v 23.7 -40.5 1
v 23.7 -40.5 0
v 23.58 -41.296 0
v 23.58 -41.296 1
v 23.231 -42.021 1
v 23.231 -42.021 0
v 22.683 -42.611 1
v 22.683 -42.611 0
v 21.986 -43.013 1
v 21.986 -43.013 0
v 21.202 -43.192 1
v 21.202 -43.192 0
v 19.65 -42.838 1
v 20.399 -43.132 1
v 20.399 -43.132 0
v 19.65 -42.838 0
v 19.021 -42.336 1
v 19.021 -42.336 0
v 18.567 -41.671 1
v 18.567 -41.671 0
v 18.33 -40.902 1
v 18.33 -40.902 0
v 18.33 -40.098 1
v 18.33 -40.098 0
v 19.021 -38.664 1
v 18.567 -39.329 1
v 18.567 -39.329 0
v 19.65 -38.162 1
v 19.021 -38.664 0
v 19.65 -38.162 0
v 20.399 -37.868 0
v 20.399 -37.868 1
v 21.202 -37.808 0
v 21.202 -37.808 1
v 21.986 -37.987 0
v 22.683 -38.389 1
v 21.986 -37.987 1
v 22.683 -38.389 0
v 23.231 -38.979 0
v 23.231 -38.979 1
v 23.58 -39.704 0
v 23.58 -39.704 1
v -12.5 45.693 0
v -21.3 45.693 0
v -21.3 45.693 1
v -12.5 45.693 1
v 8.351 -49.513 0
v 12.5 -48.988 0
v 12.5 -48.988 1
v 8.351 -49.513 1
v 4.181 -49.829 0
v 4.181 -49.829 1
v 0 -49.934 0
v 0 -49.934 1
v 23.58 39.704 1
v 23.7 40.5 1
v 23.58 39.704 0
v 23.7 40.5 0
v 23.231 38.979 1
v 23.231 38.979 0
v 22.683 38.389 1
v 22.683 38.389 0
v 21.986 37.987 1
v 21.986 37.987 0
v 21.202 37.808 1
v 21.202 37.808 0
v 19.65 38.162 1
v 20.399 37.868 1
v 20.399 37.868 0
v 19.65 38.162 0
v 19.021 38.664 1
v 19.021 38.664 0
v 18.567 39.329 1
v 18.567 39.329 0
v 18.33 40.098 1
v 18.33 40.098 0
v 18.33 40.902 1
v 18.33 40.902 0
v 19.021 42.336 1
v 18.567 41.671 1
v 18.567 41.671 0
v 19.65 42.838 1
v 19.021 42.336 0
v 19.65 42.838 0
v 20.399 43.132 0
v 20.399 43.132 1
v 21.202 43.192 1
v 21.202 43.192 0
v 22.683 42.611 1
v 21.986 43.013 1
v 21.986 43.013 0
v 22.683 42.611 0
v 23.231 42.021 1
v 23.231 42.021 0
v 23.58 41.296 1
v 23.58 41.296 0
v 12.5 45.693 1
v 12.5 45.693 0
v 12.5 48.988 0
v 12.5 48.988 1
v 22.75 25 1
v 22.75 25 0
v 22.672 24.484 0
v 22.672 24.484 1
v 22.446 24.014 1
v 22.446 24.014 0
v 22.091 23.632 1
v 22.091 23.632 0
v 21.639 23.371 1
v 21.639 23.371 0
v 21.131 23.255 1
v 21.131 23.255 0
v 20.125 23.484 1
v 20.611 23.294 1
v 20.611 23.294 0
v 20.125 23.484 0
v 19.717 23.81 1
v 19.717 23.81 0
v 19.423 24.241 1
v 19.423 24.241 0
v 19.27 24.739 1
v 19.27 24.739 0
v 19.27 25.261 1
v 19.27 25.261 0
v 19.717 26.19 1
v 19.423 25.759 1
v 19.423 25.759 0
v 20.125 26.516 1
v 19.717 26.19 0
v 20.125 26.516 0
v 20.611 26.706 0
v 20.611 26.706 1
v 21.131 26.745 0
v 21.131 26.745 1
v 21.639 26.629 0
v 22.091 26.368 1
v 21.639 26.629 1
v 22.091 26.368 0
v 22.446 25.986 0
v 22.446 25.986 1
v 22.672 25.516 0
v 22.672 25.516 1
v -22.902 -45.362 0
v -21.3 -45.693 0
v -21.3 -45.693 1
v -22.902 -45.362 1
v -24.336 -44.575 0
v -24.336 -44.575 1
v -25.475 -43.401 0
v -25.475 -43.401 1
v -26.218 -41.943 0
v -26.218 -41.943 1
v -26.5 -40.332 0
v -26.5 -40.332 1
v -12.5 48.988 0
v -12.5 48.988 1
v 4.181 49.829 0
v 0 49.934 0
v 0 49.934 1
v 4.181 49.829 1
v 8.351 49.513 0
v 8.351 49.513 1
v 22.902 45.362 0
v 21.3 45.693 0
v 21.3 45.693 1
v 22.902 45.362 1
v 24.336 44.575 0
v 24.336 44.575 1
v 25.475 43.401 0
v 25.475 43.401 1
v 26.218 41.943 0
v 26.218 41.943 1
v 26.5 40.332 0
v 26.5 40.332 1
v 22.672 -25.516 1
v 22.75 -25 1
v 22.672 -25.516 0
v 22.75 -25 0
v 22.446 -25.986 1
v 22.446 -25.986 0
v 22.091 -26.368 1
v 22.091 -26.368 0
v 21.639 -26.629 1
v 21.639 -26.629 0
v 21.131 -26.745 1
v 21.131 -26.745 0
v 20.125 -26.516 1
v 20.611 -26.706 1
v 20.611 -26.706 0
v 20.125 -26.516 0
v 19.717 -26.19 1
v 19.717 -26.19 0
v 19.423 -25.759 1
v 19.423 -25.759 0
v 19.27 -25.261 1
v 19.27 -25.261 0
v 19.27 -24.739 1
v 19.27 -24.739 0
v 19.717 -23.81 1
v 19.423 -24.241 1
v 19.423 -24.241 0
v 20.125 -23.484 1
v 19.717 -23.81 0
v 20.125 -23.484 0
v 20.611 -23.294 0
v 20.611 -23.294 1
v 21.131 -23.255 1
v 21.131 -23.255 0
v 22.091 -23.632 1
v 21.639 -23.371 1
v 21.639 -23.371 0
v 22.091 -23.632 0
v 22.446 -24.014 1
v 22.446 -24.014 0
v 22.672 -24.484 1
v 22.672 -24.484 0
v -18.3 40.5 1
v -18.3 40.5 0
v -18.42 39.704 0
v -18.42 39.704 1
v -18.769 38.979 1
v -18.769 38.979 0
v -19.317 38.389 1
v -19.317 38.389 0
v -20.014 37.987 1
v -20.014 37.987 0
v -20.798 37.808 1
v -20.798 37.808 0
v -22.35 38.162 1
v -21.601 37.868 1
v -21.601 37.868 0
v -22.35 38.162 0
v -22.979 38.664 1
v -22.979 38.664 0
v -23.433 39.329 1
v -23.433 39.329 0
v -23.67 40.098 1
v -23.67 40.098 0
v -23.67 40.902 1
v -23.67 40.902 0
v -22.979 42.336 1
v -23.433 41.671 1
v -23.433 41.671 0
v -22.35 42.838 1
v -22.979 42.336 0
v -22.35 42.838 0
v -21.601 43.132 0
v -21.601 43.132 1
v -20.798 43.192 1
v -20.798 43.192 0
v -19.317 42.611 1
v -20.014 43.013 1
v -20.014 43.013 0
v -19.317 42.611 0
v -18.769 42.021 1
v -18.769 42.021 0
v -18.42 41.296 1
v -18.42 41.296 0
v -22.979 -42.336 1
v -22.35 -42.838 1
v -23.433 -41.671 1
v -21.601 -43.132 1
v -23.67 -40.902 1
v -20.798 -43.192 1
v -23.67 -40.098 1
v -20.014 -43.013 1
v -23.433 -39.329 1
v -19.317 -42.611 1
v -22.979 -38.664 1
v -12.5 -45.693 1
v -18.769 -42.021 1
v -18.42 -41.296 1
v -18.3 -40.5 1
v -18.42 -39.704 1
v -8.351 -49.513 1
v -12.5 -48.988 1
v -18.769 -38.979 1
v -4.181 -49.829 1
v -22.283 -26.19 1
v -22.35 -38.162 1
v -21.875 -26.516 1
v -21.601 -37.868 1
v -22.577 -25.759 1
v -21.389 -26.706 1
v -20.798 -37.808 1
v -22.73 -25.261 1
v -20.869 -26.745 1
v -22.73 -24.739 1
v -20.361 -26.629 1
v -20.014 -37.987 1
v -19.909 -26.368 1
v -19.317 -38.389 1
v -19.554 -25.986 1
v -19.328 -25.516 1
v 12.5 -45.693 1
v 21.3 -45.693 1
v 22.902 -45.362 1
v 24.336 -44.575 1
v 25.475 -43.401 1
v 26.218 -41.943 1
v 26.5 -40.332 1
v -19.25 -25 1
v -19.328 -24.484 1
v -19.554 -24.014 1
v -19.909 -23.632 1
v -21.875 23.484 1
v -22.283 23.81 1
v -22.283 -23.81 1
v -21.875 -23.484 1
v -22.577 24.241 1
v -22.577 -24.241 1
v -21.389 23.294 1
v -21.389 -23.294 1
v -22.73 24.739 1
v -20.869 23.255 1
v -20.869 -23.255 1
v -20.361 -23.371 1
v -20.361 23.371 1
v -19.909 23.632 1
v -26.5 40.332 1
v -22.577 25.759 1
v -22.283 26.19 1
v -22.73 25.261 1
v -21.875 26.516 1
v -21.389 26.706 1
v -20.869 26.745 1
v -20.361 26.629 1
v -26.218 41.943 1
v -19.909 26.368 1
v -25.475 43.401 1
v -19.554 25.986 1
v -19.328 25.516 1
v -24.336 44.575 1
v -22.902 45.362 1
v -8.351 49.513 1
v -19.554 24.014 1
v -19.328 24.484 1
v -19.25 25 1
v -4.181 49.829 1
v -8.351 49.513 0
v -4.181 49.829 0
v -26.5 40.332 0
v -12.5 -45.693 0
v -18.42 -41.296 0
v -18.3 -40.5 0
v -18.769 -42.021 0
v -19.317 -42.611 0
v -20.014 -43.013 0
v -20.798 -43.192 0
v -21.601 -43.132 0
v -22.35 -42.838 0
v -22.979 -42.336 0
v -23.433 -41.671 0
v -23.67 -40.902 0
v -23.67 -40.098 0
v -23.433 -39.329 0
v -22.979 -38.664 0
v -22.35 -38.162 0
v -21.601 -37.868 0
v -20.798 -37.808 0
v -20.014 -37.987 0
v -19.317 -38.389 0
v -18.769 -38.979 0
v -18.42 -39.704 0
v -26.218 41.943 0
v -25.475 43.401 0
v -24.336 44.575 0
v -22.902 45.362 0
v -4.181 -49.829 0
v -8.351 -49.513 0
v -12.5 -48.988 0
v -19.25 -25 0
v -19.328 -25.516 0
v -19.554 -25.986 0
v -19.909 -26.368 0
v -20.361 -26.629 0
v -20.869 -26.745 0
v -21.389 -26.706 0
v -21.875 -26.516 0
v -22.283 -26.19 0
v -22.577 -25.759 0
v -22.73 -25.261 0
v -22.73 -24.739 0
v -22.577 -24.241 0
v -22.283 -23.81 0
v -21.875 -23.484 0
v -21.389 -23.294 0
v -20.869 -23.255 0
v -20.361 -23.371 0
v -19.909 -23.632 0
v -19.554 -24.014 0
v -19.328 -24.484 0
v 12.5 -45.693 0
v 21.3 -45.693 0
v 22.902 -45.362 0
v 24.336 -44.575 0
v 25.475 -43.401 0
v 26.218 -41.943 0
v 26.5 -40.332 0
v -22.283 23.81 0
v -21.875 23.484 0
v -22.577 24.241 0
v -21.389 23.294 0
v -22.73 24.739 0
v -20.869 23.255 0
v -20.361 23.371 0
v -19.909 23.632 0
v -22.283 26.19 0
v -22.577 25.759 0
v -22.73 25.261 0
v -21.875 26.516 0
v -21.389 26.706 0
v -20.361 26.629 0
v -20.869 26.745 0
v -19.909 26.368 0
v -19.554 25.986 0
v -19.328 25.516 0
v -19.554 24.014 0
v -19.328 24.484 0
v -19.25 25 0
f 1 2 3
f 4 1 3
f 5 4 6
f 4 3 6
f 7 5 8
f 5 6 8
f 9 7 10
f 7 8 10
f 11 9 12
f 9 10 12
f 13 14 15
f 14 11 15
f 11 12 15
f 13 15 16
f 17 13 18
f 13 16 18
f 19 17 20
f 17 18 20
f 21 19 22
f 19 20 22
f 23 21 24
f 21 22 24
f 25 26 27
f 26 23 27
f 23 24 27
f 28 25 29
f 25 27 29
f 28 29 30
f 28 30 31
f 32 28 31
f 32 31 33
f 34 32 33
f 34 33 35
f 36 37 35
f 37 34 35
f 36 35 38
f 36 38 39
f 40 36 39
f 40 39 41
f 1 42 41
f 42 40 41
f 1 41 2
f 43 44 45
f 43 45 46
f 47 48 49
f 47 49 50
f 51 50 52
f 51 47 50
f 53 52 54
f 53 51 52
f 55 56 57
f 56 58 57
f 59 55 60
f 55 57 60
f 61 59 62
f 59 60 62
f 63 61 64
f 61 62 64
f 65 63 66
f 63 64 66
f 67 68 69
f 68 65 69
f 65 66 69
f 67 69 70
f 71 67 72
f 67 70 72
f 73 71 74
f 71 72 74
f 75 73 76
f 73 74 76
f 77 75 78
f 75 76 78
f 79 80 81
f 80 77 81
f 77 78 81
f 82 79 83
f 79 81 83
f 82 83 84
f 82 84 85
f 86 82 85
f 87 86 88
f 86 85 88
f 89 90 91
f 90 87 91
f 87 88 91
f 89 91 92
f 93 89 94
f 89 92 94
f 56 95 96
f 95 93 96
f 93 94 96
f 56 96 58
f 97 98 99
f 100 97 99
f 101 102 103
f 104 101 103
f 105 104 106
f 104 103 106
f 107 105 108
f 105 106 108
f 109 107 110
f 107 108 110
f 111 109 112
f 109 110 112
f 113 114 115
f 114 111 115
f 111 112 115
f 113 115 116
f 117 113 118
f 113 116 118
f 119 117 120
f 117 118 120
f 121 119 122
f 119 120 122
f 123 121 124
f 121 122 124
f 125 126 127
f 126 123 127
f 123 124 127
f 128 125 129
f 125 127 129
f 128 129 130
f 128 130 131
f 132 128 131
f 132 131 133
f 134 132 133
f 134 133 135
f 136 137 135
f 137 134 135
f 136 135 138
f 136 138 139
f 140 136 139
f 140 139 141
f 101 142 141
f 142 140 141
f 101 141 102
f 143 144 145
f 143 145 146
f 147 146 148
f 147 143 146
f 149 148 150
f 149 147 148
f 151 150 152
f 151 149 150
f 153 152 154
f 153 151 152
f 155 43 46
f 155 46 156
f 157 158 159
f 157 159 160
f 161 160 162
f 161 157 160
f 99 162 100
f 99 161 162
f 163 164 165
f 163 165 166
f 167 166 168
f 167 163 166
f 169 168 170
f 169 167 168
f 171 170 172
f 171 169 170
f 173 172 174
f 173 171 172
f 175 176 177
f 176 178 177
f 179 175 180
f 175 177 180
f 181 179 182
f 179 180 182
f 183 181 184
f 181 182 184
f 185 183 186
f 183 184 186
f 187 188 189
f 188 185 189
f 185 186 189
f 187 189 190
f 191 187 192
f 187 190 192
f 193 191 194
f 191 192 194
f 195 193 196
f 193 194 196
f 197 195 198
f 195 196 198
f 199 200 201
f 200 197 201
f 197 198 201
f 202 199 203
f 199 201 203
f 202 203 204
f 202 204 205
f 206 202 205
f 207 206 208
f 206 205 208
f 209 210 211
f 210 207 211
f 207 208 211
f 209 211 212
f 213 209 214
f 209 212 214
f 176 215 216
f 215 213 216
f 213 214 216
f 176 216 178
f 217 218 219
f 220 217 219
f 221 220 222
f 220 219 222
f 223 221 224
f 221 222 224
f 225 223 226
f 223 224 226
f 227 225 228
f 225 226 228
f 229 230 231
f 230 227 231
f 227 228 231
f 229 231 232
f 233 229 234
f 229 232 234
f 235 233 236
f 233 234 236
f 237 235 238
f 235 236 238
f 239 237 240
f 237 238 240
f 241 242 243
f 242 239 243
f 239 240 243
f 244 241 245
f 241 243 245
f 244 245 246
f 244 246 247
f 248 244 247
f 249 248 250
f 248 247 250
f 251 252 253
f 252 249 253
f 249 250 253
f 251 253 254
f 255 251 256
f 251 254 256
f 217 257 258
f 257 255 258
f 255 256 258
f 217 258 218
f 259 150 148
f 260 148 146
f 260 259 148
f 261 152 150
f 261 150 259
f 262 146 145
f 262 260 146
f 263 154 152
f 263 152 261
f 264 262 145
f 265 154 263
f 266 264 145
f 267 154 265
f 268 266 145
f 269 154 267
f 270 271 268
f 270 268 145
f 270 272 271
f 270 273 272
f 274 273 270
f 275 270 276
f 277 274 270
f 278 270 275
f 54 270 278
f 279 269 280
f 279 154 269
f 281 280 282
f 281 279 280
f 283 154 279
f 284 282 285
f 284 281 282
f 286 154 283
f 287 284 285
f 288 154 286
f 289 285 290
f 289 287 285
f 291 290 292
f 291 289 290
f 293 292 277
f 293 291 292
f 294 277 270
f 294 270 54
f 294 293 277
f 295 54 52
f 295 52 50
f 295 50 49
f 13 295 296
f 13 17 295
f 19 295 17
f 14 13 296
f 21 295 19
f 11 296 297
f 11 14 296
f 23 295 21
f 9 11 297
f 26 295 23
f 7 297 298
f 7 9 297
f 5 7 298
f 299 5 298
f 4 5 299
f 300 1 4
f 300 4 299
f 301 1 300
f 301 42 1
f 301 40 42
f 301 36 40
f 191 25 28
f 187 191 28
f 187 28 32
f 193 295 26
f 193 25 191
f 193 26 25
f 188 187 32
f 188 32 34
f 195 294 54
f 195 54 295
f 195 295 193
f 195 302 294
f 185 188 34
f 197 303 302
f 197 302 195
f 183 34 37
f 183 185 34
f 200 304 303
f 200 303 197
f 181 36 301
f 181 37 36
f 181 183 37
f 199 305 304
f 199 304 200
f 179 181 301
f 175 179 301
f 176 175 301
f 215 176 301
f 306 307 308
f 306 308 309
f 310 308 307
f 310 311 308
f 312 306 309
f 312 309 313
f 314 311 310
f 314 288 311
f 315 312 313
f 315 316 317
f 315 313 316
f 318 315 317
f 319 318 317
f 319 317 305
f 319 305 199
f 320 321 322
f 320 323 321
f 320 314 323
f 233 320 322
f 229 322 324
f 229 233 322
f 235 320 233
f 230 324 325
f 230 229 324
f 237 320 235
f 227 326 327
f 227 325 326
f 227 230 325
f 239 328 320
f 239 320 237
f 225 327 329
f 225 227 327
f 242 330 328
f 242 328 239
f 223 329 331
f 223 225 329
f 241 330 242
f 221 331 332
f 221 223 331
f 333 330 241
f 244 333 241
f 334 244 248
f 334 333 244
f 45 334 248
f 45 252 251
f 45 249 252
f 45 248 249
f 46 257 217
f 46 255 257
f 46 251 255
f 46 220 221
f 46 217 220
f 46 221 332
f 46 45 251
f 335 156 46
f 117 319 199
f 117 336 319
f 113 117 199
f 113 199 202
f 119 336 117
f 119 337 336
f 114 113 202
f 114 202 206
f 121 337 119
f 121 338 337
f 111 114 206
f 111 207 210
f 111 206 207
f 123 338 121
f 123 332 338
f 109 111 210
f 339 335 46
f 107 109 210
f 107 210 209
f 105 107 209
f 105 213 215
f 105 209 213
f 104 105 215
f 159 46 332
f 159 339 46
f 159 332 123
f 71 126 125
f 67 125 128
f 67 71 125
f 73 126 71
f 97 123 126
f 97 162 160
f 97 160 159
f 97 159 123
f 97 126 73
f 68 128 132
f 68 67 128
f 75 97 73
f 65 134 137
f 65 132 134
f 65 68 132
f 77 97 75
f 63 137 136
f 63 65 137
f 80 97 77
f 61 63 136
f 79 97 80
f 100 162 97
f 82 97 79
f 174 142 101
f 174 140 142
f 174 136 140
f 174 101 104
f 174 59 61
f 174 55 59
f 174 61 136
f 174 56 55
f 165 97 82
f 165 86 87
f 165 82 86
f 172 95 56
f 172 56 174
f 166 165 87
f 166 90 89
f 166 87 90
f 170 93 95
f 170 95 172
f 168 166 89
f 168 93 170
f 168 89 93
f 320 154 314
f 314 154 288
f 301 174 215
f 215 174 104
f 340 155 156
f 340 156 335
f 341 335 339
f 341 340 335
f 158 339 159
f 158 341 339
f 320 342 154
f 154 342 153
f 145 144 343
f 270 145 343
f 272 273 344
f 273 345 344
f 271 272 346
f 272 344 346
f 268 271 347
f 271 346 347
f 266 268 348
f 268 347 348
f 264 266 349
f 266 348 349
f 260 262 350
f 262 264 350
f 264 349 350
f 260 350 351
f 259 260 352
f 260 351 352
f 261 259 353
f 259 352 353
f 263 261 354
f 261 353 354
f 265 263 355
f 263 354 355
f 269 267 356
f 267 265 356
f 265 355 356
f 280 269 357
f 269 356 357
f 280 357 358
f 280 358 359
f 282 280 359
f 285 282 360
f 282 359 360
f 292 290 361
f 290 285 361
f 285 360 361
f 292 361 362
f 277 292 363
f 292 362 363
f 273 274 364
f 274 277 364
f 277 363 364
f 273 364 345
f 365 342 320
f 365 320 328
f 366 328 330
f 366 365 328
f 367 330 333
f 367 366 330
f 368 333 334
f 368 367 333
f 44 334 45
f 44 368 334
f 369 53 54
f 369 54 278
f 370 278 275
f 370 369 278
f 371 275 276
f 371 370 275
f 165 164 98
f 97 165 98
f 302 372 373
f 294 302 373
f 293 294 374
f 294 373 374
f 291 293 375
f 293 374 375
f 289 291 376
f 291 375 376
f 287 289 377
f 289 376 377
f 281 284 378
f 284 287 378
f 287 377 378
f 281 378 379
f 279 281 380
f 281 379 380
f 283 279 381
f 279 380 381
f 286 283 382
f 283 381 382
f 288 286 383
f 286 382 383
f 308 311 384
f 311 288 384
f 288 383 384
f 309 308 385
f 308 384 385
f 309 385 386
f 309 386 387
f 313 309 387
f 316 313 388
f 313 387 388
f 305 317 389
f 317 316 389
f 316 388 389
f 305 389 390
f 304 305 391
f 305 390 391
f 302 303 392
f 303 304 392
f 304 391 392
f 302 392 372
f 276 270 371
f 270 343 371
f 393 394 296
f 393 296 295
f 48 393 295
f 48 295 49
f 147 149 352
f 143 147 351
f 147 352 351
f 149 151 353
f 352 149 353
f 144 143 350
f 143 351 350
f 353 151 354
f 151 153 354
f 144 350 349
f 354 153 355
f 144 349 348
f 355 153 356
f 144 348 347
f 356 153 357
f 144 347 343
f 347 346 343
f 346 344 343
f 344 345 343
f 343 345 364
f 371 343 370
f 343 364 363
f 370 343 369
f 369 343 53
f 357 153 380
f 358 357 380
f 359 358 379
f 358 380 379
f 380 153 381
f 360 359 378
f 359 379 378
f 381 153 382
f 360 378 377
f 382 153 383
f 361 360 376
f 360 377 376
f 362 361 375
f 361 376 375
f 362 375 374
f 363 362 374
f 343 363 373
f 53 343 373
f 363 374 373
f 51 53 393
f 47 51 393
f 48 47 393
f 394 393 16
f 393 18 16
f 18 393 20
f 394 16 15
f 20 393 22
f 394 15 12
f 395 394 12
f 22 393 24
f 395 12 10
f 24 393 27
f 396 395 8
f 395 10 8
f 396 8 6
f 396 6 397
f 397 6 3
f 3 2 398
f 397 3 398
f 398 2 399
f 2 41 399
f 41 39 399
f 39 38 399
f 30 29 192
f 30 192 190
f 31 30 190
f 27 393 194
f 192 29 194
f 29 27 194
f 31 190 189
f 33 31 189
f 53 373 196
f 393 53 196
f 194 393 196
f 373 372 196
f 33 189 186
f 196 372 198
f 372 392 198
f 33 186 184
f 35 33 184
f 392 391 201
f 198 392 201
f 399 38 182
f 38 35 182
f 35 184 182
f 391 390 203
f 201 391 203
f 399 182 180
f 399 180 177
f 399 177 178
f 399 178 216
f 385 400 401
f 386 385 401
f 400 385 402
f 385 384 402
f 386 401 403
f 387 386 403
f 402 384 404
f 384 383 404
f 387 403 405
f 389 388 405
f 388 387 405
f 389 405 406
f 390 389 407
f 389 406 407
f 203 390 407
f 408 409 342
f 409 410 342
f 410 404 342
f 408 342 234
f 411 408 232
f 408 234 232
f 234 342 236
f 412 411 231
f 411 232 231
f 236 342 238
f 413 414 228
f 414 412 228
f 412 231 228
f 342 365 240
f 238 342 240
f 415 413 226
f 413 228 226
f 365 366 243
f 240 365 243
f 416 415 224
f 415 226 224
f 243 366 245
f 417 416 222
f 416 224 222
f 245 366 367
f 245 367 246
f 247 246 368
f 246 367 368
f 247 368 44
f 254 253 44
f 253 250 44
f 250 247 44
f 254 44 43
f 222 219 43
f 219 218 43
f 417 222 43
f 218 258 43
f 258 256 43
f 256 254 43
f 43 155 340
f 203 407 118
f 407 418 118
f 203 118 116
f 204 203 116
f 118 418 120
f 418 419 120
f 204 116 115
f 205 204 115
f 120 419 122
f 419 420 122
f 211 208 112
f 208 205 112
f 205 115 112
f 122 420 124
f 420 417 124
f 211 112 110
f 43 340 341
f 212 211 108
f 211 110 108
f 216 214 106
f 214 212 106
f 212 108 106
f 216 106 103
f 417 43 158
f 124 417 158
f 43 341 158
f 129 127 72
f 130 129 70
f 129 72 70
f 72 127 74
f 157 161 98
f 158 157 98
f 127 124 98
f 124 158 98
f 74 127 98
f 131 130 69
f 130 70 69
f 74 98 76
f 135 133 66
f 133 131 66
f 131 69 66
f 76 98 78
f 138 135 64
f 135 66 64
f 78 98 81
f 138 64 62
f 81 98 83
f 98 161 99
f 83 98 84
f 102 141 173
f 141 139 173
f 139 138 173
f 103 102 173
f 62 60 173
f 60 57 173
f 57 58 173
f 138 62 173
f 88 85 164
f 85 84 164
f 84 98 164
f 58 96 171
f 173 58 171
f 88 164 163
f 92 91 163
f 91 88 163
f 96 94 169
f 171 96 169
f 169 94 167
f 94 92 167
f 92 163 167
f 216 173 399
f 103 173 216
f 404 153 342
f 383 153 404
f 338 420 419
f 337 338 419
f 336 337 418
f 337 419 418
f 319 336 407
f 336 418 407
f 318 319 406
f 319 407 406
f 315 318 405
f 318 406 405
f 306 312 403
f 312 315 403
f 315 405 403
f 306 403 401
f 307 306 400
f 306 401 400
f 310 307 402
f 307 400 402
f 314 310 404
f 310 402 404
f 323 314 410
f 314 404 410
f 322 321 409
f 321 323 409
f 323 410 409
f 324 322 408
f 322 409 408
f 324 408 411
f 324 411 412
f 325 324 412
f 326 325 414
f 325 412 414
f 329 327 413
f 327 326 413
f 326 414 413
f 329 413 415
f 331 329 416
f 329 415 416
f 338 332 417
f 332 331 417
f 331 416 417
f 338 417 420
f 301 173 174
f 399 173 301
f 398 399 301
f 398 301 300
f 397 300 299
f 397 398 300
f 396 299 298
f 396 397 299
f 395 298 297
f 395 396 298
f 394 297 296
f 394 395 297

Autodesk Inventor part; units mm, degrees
ref_plane "YZ Plane" through (0, 0, 0) normal (1, 0, 0) x (0, 1, 0)
ref_plane "XZ Plane" through (0, 0, 0) normal (0, 1, 0) x (-1, 0, 0)
ref_plane "XY Plane" through (0, 0, 0) normal (0, 0, 1) x (1, 0, 0)
sketch "Эскиз3" plane through (0, 0, 0) normal (0, 0, 1) x (1, 0, 0)
  circle A0 centre (-21, 40.5) radius 2.7
  line L0 (0, 0) -> (8.3957, 0)
  line L1 (0, 0) -> (0, -7.8184)
  circle A1 centre (21, 40.5) radius 2.7
  circle A2 centre (-21, -40.5) radius 2.7
  circle A3 centre (21, -40.5) radius 2.7
  circle A4 centre (-21, 25) radius 1.75
  circle A5 centre (21, 25) radius 1.75
  circle A6 centre (-21, -25) radius 1.75
  circle A7 centre (21, -25) radius 1.75
  line L2 (-26.5, 40.332) -> (-26.5, 0)
  arc A8 (-21.3, 45.6934) -> (-26.5, 40.332) centre (-21, 40.2) ccw
  line L3 (-21.3, 45.6934) -> (-12.5, 45.6934)
  line L4 (-12.5, 45.6934) -> (-12.5, 48.9877)
  arc A9 (0, 49.934) -> (-12.5, 48.9877) centre (0, -33.098) ccw
  line L5 (-26.5, -40.332) -> (-26.5, 0)
  arc A10 (-26.5, -40.332) -> (-21.3, -45.6934) centre (-21, -40.2) ccw
  line L6 (-21.3, -45.6934) -> (-12.5, -45.6934)
  line L7 (-12.5, -45.6934) -> (-12.5, -48.9877)
  arc A11 (-12.5, -48.9877) -> (0, -49.934) centre (0, 33.098) ccw
  line L8 (26.5, 40.332) -> (26.5, 0)
  arc A12 (26.5, 40.332) -> (21.3, 45.6934) centre (21, 40.2) ccw
  line L9 (21.3, 45.6934) -> (12.5, 45.6934)
  line L10 (12.5, 45.6934) -> (12.5, 48.9877)
  arc A13 (12.5, 48.9877) -> (0, 49.934) centre (0, -33.098) ccw
  line L11 (26.5, -40.332) -> (26.5, 0)
  arc A14 (21.3, -45.6934) -> (26.5, -40.332) centre (21, -40.2) ccw
  line L12 (21.3, -45.6934) -> (12.5, -45.6934)
  arc A15 (0, -49.934) -> (12.5, -48.9877) centre (0, 33.098) ccw
  line L13 (12.5, -45.6934) -> (12.5, -48.9877)
  circle A16 centre (-10, 38.5) radius 1.75
  circle A17 centre (10, 38.5) radius 1.75
  circle A18 centre (-10, -38.5) radius 1.75
  circle A19 centre (10, -38.5) radius 1.75
  dimension "d19" = 5.4
  dimension "d20" = 42
  dimension "d21" = 81
  dimension "d22" = 3.5
  dimension "d23" = 42
  dimension "d24" = 50
  dimension "d25" = 0
  dimension "d26" = 53
  dimension "d27" = 0.168
  dimension "d28" = 0
  dimension "d29" = 0.3
  dimension "d31" = 12.5
  dimension "d32" = 73.298
  dimension "d33" = 83.032
  dimension "d34" = 0
  dimension "d35" = 0.3
  dimension "d38" = 3.5
  dimension "d39" = 20
  dimension "d40" = 77
extrude "Тело" add sketch "Эскиз3" along normal blind 1 contours A8 L3 L4 A9 A13 L10 L9 A12 L8 L11 A14 L12 L13 A15 A11 L7 L6 A10 L5 L2 | A16 | A17 | A18 | A19
properties part number "board_outline"
